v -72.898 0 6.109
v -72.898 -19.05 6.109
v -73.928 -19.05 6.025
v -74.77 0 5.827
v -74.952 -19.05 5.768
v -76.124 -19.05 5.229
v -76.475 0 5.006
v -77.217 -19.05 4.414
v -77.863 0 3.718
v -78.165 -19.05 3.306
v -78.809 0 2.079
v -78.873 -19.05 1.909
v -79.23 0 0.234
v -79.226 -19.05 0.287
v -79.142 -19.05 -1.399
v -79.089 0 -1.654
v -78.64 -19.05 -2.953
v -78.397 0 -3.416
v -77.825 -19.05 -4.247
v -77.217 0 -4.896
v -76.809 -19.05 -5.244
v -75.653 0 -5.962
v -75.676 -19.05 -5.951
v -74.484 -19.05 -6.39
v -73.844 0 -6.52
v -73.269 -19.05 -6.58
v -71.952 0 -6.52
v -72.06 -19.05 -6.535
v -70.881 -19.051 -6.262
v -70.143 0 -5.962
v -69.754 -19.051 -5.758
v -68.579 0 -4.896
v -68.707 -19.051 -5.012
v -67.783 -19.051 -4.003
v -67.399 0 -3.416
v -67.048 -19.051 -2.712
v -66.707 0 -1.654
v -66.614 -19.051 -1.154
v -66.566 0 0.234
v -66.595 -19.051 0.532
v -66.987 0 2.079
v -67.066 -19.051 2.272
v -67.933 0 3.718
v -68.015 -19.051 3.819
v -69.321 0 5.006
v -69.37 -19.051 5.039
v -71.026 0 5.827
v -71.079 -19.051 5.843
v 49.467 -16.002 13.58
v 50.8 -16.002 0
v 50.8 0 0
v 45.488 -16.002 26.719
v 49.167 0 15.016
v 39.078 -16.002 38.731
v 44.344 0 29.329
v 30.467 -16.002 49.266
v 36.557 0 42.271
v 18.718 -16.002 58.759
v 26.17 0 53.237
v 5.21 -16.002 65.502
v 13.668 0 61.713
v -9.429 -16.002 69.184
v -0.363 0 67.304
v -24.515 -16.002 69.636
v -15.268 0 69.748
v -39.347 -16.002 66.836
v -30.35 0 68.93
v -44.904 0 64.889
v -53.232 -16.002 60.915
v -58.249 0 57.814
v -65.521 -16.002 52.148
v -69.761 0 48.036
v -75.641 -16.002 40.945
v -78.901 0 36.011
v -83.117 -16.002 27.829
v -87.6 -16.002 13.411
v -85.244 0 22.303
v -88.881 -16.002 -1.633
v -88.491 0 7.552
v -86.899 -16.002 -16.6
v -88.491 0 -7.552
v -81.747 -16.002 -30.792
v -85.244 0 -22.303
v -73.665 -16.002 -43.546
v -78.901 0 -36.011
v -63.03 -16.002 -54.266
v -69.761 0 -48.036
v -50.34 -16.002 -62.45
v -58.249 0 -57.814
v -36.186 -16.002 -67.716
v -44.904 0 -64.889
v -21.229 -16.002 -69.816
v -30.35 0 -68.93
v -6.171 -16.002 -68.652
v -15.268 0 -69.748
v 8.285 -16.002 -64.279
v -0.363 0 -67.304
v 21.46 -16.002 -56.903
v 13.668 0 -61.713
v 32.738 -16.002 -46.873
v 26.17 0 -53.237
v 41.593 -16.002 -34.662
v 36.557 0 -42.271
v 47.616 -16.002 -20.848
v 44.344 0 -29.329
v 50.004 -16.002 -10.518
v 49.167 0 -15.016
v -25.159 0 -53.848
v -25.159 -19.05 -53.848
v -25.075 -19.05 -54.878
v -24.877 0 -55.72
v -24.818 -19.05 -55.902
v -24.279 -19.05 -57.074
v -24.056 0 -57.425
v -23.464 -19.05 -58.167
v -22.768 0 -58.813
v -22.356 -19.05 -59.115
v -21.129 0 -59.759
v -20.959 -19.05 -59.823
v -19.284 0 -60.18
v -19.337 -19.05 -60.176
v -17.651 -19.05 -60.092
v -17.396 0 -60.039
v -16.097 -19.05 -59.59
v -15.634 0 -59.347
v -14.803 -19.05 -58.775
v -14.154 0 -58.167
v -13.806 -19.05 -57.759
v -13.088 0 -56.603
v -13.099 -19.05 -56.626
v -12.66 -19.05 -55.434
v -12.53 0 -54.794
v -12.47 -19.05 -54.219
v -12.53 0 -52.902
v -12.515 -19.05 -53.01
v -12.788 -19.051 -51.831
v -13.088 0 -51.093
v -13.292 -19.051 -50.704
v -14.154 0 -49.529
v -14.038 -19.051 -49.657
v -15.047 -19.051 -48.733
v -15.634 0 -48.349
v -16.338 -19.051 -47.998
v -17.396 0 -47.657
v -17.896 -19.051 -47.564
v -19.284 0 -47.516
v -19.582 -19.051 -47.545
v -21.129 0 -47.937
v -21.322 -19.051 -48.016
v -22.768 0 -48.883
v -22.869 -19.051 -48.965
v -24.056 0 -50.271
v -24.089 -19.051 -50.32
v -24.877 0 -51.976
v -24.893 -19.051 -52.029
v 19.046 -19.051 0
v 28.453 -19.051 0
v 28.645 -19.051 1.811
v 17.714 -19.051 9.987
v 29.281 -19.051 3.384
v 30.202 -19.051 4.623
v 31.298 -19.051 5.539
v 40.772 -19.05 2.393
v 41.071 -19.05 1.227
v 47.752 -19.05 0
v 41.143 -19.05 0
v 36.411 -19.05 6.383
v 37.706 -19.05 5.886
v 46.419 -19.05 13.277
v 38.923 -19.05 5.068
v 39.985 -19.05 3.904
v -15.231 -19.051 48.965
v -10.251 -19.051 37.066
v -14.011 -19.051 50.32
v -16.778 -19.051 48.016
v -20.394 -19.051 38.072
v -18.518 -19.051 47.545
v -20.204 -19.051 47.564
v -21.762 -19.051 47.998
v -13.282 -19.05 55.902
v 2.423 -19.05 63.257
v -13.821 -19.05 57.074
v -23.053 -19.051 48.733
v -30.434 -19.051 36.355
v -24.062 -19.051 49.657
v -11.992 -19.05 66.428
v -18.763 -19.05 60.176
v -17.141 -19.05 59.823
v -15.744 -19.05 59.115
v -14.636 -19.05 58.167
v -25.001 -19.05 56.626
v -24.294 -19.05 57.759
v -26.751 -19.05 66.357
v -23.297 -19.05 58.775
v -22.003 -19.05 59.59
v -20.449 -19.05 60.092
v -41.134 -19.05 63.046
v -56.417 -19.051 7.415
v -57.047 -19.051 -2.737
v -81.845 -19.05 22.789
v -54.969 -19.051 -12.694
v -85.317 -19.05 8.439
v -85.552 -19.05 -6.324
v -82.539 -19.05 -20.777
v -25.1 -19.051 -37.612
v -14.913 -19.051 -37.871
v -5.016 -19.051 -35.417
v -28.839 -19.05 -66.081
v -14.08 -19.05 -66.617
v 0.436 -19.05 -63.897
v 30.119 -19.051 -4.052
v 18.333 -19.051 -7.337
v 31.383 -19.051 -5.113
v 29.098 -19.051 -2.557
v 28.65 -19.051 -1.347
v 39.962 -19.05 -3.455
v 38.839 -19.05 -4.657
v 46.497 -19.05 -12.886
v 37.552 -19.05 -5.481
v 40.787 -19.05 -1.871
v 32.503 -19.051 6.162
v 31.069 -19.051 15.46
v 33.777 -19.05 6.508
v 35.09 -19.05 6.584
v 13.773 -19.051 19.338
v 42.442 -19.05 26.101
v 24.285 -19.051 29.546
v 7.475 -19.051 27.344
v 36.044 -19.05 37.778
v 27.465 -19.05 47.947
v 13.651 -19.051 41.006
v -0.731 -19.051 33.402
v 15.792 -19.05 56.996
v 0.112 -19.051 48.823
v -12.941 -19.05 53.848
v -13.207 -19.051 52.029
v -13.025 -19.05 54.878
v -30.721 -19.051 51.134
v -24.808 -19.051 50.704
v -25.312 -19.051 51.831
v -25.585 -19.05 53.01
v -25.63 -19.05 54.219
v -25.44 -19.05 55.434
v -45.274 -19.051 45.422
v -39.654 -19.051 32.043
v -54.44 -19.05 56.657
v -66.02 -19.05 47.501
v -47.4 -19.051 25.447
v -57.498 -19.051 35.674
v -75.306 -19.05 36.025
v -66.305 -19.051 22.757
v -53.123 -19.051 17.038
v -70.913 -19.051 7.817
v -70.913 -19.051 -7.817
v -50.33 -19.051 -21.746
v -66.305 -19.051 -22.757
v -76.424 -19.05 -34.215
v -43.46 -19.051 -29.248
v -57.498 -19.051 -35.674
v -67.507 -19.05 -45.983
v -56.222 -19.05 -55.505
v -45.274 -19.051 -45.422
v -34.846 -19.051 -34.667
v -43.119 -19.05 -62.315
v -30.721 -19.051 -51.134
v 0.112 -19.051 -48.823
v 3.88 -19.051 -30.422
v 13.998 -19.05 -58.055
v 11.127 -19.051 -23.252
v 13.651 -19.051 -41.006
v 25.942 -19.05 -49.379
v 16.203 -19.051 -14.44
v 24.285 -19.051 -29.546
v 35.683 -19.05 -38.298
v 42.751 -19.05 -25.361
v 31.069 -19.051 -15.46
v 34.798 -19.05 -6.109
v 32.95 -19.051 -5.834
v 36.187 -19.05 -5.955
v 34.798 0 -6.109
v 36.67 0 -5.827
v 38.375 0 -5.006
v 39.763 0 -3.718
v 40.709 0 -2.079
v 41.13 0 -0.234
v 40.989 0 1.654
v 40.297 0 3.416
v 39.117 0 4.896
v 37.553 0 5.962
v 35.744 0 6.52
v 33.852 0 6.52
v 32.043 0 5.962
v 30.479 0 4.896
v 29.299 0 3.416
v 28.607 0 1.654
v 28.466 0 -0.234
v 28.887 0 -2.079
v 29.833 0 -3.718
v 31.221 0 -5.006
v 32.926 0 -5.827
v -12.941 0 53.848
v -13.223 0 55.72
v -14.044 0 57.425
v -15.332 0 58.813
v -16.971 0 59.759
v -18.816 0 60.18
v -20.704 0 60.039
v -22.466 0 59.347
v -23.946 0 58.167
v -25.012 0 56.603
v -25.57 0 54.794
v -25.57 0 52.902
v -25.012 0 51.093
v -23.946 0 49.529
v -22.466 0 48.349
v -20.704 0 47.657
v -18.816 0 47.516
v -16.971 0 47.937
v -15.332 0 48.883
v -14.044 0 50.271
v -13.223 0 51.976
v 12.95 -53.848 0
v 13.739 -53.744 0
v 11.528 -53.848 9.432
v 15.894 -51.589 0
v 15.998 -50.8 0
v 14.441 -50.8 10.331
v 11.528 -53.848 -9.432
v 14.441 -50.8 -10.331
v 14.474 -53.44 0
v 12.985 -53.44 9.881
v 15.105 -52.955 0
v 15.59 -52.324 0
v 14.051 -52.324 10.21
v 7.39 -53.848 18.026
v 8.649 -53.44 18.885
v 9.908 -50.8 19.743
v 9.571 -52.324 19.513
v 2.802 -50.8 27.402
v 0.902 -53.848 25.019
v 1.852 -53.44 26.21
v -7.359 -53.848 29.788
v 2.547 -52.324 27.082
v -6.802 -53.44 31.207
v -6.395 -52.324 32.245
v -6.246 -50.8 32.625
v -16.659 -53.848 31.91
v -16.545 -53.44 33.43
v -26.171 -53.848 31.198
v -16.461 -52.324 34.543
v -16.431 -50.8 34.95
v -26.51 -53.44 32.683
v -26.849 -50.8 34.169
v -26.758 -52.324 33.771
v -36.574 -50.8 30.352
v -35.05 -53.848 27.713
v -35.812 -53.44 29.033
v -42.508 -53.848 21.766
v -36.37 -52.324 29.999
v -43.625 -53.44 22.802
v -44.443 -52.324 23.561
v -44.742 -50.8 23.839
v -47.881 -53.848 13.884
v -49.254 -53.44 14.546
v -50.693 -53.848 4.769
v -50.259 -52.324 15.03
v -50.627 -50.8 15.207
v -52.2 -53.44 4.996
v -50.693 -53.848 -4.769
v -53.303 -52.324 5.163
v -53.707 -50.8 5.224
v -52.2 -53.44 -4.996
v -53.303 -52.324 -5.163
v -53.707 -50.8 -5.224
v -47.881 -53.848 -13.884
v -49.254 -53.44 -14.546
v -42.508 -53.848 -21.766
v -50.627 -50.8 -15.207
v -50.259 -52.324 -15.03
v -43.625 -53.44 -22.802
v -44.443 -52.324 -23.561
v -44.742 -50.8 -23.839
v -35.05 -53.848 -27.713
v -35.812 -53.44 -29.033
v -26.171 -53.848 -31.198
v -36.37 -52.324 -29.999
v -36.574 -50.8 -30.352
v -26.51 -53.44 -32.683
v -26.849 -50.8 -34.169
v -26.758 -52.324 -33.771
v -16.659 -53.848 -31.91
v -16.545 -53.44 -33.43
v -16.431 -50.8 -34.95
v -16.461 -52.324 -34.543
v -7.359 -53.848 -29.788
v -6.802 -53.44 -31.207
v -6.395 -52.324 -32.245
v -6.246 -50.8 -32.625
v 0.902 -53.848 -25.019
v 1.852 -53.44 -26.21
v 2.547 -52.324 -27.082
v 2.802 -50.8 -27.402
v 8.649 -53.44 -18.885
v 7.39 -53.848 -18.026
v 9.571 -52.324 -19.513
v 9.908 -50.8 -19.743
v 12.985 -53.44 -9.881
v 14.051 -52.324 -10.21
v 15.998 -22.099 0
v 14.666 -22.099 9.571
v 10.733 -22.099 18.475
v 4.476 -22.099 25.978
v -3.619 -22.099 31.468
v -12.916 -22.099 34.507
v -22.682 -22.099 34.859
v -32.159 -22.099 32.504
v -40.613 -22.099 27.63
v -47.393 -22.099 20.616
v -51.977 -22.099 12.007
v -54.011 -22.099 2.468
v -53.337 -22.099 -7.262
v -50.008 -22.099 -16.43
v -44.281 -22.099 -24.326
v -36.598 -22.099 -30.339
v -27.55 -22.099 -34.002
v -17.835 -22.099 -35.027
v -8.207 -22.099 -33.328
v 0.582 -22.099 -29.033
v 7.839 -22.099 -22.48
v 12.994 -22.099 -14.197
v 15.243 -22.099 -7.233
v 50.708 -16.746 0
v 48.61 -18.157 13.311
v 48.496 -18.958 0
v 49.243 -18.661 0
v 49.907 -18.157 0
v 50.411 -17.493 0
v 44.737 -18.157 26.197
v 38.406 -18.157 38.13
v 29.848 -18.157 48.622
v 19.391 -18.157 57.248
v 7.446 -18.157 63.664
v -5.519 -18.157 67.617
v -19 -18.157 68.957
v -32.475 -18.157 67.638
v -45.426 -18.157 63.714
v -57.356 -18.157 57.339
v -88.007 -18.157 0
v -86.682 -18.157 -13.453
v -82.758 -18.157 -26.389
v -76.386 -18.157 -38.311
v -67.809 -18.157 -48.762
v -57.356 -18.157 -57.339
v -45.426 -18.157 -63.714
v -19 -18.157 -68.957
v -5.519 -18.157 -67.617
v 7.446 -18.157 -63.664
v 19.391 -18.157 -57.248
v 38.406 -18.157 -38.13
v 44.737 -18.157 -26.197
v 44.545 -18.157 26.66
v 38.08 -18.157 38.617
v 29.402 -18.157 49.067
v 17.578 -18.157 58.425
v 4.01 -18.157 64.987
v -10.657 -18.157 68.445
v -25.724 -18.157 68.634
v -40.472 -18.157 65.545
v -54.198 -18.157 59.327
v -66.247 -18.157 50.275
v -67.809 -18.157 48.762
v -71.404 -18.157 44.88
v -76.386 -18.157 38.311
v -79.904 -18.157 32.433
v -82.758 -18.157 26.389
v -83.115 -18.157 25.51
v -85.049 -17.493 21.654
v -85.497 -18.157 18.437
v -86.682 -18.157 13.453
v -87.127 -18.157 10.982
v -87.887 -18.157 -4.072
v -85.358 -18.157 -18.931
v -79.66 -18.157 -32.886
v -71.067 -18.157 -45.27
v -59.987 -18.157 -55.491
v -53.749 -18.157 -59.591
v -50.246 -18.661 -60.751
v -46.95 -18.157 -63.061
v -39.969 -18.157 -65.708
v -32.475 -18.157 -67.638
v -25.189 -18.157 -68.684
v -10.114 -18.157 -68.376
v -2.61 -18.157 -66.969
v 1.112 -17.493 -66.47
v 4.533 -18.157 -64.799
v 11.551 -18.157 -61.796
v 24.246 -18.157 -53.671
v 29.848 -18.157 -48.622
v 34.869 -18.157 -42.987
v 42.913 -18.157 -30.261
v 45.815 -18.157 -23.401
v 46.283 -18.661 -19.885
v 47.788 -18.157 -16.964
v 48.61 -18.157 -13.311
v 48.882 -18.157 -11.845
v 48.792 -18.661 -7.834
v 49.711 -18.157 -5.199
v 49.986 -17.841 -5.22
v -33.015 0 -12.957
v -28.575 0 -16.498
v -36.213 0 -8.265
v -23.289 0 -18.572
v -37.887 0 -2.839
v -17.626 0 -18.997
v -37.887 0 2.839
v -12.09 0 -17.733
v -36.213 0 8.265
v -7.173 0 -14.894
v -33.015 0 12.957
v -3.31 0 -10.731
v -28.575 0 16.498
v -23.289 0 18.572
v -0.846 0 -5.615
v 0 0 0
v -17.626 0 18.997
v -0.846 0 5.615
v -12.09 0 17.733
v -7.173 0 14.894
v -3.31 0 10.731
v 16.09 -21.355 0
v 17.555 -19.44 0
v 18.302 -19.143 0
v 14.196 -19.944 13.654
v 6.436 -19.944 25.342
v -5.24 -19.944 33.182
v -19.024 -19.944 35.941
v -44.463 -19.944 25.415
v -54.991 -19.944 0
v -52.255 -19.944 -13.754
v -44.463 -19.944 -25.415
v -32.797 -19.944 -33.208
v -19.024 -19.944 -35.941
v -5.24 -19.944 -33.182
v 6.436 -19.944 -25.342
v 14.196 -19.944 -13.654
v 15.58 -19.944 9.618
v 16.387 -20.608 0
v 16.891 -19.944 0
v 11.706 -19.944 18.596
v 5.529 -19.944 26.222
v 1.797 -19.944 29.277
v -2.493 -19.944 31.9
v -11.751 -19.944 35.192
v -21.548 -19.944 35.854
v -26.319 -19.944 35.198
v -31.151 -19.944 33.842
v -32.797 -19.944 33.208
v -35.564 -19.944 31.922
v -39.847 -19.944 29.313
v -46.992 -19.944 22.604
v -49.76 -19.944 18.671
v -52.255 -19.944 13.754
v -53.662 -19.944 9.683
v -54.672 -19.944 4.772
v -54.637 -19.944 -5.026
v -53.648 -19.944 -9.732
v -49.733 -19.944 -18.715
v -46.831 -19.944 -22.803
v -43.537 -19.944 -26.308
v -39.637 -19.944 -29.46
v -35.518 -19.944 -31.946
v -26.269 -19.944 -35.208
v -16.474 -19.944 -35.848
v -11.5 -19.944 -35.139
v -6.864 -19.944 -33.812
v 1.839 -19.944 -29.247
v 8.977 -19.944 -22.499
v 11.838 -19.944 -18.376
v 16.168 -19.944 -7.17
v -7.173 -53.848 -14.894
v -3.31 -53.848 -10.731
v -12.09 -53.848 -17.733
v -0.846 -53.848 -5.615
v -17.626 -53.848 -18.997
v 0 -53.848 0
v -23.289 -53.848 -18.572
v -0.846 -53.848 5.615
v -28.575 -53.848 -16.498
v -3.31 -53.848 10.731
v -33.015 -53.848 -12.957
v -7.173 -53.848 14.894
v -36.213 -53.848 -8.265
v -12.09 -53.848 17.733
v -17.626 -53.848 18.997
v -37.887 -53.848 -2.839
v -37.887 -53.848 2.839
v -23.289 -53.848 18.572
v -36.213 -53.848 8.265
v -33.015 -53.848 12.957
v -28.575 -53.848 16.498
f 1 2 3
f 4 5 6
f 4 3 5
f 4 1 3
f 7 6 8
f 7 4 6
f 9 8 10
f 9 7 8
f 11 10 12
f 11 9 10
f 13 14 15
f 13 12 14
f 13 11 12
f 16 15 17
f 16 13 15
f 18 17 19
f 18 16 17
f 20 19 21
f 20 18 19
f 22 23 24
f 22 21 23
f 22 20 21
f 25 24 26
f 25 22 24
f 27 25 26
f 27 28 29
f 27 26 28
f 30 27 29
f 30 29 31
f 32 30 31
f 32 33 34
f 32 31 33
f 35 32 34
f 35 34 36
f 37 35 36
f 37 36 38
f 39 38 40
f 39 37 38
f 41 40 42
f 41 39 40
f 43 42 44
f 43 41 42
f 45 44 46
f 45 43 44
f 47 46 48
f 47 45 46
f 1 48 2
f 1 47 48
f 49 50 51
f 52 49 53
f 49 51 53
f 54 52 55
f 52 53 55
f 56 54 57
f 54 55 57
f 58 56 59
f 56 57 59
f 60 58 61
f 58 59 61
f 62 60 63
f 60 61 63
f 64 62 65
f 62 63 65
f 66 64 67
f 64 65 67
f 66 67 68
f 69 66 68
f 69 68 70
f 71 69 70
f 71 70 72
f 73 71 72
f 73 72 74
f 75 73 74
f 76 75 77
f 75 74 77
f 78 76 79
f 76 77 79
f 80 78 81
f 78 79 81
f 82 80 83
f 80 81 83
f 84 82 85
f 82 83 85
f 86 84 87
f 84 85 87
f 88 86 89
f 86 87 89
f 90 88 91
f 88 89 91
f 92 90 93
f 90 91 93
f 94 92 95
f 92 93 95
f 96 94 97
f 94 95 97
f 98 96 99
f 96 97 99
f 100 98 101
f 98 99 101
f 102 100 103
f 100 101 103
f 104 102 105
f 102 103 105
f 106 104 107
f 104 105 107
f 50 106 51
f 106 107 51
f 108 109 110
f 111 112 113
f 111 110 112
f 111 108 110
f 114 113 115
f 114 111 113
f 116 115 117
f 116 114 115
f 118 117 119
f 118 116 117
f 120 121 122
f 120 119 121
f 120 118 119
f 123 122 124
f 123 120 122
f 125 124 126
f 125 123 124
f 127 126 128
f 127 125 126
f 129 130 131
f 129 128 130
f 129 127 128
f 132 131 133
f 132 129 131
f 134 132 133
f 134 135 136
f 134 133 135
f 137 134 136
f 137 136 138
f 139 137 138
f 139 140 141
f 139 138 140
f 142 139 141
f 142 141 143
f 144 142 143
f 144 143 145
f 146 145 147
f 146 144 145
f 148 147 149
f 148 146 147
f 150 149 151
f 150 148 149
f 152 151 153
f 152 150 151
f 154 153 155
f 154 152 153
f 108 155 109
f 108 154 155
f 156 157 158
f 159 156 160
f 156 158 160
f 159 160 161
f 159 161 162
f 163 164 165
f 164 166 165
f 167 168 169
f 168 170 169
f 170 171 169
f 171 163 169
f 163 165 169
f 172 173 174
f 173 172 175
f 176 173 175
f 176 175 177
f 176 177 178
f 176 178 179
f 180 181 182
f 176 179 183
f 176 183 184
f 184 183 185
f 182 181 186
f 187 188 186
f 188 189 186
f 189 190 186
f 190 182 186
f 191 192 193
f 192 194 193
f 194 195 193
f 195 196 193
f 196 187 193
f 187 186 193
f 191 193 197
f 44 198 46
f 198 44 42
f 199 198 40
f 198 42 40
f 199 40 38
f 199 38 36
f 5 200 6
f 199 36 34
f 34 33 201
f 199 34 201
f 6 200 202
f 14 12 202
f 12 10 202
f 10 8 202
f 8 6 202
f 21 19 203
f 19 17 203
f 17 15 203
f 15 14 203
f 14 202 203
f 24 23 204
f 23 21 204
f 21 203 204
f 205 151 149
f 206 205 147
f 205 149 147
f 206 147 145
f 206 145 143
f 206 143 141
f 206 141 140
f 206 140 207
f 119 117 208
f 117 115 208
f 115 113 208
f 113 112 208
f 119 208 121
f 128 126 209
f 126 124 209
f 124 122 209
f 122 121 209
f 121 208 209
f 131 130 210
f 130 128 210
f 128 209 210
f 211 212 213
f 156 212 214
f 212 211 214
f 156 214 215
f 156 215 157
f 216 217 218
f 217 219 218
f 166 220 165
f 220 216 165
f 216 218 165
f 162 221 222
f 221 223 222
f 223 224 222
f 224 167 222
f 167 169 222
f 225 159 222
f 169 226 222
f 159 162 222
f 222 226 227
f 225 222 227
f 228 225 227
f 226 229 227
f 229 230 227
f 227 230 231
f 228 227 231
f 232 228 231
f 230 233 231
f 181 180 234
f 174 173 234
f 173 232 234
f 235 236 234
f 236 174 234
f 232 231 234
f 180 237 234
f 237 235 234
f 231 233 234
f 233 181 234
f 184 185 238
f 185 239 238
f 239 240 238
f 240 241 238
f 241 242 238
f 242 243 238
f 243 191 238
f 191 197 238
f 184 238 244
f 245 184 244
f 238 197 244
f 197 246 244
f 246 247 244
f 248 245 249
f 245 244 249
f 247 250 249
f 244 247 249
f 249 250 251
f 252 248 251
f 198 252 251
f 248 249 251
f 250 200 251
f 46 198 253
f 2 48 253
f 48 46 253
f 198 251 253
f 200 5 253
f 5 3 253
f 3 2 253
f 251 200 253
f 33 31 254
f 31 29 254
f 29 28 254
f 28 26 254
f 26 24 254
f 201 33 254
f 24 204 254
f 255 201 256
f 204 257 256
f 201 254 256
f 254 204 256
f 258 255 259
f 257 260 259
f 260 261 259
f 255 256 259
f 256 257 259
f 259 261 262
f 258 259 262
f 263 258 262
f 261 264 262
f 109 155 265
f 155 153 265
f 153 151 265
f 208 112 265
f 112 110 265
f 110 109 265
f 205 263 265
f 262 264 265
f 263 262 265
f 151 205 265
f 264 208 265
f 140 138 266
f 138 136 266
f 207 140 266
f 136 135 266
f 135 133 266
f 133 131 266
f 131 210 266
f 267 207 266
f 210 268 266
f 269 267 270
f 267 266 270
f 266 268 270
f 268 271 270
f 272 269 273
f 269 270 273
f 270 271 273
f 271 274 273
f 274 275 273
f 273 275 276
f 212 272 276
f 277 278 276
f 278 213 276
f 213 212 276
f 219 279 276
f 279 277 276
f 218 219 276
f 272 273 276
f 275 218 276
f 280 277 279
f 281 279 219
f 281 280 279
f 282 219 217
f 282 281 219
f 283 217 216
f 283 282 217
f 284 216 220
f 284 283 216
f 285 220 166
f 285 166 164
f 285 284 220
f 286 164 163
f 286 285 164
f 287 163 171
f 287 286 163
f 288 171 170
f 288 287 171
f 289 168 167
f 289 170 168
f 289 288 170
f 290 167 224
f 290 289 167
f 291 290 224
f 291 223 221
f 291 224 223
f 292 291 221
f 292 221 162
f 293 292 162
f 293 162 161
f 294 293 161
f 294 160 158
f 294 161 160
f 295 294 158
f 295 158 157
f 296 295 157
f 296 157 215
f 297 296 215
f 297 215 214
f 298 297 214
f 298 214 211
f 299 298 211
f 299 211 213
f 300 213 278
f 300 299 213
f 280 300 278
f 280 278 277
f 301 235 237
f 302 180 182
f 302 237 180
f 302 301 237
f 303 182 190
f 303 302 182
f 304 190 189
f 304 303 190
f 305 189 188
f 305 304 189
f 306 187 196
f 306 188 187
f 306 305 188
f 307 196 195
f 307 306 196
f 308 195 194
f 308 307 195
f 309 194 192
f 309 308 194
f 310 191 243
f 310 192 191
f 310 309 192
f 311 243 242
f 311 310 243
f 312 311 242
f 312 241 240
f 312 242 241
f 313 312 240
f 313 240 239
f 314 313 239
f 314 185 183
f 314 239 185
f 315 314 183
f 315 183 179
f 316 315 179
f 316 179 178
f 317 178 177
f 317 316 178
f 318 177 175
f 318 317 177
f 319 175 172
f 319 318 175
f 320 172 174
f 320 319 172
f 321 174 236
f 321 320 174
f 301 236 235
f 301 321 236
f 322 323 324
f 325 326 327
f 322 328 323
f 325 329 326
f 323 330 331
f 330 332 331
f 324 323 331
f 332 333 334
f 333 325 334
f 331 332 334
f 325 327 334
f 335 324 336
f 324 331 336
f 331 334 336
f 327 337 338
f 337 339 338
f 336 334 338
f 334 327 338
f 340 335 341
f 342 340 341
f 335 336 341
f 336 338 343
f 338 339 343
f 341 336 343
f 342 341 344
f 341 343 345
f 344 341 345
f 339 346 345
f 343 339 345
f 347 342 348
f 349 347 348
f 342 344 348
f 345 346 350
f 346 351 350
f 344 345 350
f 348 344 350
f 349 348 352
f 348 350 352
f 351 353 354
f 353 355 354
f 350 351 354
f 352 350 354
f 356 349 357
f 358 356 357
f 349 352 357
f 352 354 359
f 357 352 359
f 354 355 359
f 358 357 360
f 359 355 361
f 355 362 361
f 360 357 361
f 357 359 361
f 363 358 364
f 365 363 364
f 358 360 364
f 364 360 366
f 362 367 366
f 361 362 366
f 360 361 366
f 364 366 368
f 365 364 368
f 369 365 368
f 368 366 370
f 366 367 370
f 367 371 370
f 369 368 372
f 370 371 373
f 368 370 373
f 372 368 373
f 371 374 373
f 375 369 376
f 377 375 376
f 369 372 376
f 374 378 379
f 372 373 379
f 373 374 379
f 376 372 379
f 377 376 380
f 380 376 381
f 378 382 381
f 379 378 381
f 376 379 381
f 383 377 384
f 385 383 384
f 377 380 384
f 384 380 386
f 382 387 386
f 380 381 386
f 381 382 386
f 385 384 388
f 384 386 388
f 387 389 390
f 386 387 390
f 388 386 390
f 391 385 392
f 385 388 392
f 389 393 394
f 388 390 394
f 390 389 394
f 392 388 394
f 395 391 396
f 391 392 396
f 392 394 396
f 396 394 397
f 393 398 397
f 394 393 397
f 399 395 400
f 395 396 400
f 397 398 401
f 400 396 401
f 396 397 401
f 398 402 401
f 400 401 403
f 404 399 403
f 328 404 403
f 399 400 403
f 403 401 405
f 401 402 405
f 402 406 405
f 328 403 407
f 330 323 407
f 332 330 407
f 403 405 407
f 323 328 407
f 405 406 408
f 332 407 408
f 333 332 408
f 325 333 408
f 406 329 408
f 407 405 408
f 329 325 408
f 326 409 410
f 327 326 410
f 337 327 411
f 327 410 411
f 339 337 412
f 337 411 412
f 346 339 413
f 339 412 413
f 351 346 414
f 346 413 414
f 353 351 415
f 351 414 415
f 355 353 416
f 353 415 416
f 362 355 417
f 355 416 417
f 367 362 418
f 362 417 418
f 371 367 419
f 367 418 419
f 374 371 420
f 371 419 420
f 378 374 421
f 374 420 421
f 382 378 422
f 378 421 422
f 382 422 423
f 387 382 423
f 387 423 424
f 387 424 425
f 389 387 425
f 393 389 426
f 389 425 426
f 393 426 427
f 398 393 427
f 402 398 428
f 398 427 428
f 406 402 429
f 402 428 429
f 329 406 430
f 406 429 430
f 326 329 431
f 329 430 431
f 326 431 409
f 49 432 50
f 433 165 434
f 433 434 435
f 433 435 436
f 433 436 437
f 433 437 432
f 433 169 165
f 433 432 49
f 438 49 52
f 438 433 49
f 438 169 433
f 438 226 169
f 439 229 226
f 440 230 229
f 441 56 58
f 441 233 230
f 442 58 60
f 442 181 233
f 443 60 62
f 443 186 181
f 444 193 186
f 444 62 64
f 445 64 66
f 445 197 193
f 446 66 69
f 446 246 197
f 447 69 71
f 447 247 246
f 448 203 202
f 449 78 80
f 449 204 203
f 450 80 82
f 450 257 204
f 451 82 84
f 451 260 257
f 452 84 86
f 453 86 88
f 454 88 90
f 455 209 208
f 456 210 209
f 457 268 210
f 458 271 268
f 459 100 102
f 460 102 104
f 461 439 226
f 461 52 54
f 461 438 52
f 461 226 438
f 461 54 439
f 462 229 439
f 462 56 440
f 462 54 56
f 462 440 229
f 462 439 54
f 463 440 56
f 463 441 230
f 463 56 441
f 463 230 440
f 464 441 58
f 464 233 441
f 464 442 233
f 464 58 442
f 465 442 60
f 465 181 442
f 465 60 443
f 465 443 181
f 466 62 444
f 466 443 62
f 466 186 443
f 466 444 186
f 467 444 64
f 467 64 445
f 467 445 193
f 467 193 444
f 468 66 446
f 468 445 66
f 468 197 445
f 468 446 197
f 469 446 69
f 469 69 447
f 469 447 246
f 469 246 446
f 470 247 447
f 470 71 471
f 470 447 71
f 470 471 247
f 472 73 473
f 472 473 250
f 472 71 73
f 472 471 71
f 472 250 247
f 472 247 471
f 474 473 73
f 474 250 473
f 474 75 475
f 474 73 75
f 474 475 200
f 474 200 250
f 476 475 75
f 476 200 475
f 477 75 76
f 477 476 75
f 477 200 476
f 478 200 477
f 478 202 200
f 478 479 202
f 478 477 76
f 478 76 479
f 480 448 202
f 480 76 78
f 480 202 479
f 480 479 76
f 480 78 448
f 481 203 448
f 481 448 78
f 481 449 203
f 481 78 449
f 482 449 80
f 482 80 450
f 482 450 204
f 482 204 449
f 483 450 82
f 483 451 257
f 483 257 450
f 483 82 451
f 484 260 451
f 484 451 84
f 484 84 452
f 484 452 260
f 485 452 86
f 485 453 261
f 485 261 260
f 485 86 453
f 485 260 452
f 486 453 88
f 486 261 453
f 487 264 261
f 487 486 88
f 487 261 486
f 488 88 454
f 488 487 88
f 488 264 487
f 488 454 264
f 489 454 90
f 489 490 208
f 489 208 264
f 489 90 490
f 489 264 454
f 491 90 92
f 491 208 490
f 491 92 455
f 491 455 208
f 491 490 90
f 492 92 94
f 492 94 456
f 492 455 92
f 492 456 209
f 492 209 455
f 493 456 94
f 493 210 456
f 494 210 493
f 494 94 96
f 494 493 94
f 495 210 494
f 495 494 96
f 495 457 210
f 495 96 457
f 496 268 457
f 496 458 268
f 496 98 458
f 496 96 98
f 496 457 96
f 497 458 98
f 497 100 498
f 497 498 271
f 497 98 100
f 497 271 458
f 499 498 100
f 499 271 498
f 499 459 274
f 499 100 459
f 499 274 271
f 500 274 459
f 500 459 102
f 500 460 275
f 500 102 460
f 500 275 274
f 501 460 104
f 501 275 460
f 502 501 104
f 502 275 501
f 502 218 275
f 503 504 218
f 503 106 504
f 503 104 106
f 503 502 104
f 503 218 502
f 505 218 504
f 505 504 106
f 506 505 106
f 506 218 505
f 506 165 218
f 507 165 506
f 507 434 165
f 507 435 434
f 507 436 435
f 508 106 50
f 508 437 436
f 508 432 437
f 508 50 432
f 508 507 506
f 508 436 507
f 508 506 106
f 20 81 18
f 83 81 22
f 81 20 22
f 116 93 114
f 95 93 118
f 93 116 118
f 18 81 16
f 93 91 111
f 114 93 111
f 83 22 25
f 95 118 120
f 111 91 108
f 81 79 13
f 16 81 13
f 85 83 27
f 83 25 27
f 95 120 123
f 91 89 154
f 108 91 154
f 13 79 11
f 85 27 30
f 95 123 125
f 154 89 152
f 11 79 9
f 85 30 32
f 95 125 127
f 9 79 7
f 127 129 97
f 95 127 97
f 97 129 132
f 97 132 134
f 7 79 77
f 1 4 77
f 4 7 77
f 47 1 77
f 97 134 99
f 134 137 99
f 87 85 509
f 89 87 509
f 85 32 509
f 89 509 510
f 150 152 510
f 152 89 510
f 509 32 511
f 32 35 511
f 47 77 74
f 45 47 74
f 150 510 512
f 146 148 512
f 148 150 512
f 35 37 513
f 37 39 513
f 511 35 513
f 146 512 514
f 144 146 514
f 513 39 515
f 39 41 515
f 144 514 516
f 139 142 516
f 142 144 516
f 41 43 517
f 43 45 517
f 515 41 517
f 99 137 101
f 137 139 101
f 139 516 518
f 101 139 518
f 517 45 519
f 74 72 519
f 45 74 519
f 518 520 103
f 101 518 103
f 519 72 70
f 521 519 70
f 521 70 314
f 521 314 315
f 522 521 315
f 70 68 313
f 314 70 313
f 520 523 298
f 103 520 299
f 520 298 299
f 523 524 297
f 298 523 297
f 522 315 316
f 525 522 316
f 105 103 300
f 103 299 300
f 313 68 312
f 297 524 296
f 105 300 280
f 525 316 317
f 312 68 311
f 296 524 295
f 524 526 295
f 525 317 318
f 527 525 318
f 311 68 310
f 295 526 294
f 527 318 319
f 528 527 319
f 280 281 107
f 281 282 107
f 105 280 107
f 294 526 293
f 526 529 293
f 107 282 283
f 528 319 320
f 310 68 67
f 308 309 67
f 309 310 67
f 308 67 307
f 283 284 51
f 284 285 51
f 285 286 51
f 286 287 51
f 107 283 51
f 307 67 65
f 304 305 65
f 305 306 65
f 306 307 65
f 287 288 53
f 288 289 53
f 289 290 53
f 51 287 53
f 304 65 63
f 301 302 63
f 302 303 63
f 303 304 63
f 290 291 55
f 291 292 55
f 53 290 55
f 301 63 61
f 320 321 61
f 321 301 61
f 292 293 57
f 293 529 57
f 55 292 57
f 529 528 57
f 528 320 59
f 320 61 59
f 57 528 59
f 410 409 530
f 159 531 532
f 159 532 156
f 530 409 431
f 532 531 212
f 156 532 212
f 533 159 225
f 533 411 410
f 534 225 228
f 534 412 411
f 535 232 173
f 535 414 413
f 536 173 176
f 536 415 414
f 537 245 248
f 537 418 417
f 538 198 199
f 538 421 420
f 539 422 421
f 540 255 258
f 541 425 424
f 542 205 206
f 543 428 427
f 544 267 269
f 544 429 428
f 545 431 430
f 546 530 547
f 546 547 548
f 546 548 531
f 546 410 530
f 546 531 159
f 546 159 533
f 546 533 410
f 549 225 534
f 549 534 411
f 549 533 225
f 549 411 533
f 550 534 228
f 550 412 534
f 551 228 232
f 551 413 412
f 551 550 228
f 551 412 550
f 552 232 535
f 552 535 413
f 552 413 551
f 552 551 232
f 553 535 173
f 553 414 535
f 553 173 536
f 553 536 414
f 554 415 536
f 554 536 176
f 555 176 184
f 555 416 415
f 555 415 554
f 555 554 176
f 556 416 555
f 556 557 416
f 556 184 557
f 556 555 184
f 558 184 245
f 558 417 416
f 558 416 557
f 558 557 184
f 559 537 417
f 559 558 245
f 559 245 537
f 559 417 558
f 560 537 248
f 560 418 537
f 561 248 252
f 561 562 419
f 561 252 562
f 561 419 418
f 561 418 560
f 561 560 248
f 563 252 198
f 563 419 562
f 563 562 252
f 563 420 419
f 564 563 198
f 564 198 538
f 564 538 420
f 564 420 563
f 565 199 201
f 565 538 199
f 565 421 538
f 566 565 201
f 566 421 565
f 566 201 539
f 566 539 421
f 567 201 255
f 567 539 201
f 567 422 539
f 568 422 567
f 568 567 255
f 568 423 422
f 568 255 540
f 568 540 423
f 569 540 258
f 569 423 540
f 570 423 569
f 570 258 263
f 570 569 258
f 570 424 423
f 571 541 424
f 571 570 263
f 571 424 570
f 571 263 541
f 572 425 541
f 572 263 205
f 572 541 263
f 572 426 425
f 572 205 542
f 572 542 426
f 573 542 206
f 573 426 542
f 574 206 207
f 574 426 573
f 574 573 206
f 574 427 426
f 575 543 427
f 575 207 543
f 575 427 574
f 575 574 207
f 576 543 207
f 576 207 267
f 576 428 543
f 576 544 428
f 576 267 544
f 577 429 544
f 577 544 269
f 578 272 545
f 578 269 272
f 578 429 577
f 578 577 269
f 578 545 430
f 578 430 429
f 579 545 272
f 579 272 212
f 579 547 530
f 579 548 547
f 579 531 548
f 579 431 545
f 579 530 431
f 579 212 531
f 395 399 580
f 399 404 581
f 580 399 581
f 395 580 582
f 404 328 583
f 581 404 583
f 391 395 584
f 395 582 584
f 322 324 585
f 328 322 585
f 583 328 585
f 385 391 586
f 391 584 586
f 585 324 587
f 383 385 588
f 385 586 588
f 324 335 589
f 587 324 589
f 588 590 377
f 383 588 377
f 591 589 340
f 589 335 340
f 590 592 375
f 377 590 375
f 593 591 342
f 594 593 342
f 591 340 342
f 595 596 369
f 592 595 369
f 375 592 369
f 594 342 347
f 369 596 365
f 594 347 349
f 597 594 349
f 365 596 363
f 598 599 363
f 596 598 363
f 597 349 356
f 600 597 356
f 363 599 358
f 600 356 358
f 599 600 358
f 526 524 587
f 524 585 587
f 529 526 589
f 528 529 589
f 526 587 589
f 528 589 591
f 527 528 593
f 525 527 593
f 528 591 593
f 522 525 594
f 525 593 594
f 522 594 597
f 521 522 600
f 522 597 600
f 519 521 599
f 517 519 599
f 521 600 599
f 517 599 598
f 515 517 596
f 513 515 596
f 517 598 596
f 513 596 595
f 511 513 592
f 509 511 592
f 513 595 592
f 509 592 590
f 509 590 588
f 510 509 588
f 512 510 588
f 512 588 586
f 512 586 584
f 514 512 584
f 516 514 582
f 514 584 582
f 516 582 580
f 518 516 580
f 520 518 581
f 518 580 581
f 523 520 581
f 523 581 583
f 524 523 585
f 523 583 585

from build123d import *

# Parameters (mm, degrees)
F2_R            = 3.048
F3_R            = 6.35
F4_DEPTH        = 53.849
F4_COPIES_COUNT = 4


# Not quite as in the source:
# - a pattern or mirror of a feature is missing from the dataset's text; its kind, count and spacing are read off the source's solid


with BuildPart() as f1:
    # F0 (on Top) → F1 (revolve)
    with BuildSketch(Plane.XY):
        Polygon((50.8, 0), (0, 0), (0, -53.848), (15.9979741, -53.848), (15.9979741, -19.0510369452), (50.8, -19.05), align=None)
    revolve(axis=Axis((-19.05, -27.312900871, 0), (0, -1, 0)))

    # F2
    f2_edges = [f1.edges().sort_by_distance(p)[0] for p in [
        (-88.9, -19.05, 0),
        (-54.097974, -19.051037, 0),
        (-54.097974, -53.848, 0),
    ]]
    fillet(f2_edges, radius=F2_R)

    # F3 (on Front) → F4 (cut, through all)
    with BuildSketch(Plane.XZ):
        with Locations((-19.2909650505, 53.848)):
            Circle(F3_R)
    f4 = extrude(amount=F4_DEPTH, mode=Mode.SUBTRACT)

    # F4_copies: F4 ×4 about axis
    f4_copies_axis = Axis((-19.05, 0, 0), (0, 1, 0))
    for i in range(1, F4_COPIES_COUNT):
        add(f4.rotate(f4_copies_axis, i * 360 / F4_COPIES_COUNT), mode=Mode.SUBTRACT)


solid = f1.part
